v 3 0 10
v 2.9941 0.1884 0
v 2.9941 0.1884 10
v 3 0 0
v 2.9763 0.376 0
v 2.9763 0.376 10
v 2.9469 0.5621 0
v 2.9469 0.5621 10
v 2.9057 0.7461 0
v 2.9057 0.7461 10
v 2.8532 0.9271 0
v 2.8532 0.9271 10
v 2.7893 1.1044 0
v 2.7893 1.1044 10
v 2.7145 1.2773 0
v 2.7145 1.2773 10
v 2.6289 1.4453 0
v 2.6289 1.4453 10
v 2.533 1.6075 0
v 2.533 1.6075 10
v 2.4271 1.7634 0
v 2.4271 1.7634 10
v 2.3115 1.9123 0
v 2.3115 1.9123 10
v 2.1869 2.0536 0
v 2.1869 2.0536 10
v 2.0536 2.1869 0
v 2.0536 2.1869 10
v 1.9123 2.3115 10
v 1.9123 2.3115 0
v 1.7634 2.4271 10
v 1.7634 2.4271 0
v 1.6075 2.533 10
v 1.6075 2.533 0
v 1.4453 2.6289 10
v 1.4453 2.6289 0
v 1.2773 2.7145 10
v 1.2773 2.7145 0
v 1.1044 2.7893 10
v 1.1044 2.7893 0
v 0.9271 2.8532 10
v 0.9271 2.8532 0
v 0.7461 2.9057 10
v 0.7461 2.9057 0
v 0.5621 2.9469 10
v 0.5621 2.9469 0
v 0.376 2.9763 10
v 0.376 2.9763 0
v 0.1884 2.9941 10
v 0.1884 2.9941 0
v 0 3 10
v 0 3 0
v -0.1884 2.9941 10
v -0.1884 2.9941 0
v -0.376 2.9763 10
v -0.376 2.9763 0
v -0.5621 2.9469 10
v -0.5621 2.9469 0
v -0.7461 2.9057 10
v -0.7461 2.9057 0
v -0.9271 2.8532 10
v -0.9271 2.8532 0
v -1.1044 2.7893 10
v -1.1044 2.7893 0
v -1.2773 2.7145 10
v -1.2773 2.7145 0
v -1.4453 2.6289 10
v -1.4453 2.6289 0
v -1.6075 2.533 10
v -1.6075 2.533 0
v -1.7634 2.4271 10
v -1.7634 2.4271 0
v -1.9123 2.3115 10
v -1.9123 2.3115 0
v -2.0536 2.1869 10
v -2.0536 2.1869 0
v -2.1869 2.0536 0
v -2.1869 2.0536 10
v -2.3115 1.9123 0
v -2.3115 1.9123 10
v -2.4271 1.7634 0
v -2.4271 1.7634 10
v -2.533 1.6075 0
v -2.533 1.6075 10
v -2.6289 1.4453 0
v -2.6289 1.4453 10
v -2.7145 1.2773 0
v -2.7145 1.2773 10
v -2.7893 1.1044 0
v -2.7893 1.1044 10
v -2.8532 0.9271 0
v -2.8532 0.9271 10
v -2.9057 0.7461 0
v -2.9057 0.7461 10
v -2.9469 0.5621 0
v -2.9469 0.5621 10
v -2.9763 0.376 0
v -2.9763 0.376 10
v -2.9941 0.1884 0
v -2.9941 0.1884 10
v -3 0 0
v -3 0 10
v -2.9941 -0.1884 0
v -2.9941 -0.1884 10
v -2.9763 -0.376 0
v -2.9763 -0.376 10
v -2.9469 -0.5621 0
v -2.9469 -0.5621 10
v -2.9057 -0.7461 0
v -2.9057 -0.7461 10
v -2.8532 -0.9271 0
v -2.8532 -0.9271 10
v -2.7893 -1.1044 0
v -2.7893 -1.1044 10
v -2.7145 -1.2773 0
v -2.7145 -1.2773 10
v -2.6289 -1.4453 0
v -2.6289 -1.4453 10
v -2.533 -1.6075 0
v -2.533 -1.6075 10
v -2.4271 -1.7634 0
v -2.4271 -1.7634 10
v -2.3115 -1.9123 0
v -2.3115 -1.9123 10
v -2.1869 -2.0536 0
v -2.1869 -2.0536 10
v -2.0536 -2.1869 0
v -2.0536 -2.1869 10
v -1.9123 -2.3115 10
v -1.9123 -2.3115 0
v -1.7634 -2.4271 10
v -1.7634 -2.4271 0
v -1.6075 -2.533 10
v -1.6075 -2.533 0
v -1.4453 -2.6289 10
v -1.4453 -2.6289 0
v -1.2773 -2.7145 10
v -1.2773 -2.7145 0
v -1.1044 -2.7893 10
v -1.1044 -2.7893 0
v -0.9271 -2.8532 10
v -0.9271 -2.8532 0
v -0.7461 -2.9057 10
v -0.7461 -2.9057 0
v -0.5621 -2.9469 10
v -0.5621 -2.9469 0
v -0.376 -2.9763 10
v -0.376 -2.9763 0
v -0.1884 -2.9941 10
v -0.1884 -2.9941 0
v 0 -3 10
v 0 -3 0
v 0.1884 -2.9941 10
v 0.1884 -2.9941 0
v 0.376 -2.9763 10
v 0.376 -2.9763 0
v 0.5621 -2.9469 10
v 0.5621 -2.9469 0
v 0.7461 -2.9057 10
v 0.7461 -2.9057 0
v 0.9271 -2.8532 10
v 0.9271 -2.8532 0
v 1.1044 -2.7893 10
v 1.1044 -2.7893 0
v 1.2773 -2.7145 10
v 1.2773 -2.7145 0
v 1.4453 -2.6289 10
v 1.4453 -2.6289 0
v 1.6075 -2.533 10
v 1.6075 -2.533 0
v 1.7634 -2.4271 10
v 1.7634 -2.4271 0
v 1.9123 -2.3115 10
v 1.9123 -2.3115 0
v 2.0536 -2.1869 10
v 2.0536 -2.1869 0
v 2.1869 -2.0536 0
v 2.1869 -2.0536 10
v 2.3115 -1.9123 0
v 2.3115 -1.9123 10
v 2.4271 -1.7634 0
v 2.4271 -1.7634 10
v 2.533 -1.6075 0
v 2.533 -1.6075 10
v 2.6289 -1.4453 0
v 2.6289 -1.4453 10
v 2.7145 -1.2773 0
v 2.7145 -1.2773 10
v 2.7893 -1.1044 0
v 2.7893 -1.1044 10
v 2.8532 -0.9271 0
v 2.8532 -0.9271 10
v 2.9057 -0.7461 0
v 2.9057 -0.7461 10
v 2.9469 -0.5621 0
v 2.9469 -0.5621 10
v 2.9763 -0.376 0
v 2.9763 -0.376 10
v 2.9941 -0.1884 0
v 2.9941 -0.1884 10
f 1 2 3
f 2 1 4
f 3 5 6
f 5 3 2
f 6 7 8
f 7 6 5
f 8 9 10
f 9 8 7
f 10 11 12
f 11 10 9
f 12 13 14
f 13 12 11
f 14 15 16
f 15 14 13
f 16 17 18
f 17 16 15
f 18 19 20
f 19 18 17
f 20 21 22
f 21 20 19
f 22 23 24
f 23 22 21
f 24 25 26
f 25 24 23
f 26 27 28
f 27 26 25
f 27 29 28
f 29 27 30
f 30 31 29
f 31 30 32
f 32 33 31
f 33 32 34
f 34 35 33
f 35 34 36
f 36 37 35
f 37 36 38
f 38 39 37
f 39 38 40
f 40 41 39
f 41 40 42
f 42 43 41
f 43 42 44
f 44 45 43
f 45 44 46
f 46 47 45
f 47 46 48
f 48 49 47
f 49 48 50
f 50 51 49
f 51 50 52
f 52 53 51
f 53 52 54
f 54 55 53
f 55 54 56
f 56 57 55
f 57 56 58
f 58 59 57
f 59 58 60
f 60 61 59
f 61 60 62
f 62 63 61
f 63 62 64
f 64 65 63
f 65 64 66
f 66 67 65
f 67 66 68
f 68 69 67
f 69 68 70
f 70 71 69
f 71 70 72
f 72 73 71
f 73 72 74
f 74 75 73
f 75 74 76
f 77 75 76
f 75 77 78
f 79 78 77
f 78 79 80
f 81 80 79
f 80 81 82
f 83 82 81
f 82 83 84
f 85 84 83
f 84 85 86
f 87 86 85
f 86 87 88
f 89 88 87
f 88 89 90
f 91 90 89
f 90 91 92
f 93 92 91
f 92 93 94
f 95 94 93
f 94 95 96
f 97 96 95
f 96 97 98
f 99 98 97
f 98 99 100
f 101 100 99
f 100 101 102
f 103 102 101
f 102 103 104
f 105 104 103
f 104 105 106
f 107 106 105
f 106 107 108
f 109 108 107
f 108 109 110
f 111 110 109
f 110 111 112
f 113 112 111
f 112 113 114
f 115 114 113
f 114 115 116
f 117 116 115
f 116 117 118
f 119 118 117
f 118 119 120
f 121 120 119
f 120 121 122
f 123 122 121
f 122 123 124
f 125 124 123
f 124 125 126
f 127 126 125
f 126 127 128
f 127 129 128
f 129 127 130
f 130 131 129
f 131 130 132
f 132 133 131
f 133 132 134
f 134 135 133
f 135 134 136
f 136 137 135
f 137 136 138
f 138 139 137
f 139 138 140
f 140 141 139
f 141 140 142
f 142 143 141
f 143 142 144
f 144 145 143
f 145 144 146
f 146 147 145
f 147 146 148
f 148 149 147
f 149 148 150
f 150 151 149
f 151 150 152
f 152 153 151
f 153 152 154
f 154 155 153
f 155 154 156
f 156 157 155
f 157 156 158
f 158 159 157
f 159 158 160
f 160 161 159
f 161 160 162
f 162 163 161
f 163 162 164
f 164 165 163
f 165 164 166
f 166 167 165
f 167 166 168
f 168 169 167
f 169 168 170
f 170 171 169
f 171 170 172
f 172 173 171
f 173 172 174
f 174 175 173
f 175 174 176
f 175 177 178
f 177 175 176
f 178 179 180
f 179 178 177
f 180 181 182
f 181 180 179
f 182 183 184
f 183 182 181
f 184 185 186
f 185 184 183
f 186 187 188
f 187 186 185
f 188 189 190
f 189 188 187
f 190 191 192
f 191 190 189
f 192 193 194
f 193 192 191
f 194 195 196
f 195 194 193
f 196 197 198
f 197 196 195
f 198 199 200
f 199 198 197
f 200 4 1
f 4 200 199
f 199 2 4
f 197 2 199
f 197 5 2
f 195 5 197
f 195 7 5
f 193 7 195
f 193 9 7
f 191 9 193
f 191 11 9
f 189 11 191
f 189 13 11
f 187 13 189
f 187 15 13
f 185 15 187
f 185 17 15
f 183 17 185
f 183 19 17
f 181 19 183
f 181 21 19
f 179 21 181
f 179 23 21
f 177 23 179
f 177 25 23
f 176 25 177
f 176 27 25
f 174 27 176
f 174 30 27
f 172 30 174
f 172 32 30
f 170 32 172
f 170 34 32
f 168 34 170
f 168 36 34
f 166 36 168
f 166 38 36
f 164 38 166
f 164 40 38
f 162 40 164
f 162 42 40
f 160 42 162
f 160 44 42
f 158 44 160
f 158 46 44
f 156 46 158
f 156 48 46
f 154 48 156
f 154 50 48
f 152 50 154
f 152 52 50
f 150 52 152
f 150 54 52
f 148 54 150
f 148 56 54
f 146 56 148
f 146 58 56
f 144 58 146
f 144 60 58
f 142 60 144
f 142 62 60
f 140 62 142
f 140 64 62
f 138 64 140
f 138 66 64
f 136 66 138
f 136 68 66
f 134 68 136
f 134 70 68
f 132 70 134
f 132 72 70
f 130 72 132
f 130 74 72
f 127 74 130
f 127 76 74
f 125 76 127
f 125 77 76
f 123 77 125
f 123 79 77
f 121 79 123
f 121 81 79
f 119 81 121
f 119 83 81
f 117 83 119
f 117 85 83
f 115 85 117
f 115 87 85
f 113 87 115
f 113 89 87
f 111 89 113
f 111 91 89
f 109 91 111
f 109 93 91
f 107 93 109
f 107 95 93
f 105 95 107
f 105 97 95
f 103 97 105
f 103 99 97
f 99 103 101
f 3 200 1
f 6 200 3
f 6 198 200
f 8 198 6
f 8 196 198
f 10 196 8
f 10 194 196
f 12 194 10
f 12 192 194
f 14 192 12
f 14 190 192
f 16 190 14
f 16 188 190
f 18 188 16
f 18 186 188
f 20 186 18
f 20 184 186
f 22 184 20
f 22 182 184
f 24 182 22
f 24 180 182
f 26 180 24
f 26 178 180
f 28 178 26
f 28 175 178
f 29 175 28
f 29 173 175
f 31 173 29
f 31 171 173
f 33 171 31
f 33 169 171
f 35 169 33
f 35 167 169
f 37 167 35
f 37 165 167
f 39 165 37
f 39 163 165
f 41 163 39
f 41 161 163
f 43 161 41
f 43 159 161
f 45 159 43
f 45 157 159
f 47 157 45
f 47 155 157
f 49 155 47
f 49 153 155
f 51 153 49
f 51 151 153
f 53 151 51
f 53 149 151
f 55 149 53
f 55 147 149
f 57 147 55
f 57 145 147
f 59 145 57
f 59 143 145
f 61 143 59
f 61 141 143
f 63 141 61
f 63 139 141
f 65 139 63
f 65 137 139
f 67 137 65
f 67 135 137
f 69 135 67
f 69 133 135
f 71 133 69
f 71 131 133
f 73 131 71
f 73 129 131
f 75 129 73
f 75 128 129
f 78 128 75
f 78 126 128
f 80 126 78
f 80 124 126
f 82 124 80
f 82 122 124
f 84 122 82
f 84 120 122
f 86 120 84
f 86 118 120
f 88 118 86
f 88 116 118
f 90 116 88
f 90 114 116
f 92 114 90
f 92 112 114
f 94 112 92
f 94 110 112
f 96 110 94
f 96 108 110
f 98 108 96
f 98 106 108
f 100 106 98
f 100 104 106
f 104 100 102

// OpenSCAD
// Generated by Mecha (https://github.com/tomahawkins/mecha)

color([0.5, 0.5, 0.5, 1.0]) cylinder(h = 10.0, r1 = 3.0, r2 = 3.0, center = false, $fn = 100);
